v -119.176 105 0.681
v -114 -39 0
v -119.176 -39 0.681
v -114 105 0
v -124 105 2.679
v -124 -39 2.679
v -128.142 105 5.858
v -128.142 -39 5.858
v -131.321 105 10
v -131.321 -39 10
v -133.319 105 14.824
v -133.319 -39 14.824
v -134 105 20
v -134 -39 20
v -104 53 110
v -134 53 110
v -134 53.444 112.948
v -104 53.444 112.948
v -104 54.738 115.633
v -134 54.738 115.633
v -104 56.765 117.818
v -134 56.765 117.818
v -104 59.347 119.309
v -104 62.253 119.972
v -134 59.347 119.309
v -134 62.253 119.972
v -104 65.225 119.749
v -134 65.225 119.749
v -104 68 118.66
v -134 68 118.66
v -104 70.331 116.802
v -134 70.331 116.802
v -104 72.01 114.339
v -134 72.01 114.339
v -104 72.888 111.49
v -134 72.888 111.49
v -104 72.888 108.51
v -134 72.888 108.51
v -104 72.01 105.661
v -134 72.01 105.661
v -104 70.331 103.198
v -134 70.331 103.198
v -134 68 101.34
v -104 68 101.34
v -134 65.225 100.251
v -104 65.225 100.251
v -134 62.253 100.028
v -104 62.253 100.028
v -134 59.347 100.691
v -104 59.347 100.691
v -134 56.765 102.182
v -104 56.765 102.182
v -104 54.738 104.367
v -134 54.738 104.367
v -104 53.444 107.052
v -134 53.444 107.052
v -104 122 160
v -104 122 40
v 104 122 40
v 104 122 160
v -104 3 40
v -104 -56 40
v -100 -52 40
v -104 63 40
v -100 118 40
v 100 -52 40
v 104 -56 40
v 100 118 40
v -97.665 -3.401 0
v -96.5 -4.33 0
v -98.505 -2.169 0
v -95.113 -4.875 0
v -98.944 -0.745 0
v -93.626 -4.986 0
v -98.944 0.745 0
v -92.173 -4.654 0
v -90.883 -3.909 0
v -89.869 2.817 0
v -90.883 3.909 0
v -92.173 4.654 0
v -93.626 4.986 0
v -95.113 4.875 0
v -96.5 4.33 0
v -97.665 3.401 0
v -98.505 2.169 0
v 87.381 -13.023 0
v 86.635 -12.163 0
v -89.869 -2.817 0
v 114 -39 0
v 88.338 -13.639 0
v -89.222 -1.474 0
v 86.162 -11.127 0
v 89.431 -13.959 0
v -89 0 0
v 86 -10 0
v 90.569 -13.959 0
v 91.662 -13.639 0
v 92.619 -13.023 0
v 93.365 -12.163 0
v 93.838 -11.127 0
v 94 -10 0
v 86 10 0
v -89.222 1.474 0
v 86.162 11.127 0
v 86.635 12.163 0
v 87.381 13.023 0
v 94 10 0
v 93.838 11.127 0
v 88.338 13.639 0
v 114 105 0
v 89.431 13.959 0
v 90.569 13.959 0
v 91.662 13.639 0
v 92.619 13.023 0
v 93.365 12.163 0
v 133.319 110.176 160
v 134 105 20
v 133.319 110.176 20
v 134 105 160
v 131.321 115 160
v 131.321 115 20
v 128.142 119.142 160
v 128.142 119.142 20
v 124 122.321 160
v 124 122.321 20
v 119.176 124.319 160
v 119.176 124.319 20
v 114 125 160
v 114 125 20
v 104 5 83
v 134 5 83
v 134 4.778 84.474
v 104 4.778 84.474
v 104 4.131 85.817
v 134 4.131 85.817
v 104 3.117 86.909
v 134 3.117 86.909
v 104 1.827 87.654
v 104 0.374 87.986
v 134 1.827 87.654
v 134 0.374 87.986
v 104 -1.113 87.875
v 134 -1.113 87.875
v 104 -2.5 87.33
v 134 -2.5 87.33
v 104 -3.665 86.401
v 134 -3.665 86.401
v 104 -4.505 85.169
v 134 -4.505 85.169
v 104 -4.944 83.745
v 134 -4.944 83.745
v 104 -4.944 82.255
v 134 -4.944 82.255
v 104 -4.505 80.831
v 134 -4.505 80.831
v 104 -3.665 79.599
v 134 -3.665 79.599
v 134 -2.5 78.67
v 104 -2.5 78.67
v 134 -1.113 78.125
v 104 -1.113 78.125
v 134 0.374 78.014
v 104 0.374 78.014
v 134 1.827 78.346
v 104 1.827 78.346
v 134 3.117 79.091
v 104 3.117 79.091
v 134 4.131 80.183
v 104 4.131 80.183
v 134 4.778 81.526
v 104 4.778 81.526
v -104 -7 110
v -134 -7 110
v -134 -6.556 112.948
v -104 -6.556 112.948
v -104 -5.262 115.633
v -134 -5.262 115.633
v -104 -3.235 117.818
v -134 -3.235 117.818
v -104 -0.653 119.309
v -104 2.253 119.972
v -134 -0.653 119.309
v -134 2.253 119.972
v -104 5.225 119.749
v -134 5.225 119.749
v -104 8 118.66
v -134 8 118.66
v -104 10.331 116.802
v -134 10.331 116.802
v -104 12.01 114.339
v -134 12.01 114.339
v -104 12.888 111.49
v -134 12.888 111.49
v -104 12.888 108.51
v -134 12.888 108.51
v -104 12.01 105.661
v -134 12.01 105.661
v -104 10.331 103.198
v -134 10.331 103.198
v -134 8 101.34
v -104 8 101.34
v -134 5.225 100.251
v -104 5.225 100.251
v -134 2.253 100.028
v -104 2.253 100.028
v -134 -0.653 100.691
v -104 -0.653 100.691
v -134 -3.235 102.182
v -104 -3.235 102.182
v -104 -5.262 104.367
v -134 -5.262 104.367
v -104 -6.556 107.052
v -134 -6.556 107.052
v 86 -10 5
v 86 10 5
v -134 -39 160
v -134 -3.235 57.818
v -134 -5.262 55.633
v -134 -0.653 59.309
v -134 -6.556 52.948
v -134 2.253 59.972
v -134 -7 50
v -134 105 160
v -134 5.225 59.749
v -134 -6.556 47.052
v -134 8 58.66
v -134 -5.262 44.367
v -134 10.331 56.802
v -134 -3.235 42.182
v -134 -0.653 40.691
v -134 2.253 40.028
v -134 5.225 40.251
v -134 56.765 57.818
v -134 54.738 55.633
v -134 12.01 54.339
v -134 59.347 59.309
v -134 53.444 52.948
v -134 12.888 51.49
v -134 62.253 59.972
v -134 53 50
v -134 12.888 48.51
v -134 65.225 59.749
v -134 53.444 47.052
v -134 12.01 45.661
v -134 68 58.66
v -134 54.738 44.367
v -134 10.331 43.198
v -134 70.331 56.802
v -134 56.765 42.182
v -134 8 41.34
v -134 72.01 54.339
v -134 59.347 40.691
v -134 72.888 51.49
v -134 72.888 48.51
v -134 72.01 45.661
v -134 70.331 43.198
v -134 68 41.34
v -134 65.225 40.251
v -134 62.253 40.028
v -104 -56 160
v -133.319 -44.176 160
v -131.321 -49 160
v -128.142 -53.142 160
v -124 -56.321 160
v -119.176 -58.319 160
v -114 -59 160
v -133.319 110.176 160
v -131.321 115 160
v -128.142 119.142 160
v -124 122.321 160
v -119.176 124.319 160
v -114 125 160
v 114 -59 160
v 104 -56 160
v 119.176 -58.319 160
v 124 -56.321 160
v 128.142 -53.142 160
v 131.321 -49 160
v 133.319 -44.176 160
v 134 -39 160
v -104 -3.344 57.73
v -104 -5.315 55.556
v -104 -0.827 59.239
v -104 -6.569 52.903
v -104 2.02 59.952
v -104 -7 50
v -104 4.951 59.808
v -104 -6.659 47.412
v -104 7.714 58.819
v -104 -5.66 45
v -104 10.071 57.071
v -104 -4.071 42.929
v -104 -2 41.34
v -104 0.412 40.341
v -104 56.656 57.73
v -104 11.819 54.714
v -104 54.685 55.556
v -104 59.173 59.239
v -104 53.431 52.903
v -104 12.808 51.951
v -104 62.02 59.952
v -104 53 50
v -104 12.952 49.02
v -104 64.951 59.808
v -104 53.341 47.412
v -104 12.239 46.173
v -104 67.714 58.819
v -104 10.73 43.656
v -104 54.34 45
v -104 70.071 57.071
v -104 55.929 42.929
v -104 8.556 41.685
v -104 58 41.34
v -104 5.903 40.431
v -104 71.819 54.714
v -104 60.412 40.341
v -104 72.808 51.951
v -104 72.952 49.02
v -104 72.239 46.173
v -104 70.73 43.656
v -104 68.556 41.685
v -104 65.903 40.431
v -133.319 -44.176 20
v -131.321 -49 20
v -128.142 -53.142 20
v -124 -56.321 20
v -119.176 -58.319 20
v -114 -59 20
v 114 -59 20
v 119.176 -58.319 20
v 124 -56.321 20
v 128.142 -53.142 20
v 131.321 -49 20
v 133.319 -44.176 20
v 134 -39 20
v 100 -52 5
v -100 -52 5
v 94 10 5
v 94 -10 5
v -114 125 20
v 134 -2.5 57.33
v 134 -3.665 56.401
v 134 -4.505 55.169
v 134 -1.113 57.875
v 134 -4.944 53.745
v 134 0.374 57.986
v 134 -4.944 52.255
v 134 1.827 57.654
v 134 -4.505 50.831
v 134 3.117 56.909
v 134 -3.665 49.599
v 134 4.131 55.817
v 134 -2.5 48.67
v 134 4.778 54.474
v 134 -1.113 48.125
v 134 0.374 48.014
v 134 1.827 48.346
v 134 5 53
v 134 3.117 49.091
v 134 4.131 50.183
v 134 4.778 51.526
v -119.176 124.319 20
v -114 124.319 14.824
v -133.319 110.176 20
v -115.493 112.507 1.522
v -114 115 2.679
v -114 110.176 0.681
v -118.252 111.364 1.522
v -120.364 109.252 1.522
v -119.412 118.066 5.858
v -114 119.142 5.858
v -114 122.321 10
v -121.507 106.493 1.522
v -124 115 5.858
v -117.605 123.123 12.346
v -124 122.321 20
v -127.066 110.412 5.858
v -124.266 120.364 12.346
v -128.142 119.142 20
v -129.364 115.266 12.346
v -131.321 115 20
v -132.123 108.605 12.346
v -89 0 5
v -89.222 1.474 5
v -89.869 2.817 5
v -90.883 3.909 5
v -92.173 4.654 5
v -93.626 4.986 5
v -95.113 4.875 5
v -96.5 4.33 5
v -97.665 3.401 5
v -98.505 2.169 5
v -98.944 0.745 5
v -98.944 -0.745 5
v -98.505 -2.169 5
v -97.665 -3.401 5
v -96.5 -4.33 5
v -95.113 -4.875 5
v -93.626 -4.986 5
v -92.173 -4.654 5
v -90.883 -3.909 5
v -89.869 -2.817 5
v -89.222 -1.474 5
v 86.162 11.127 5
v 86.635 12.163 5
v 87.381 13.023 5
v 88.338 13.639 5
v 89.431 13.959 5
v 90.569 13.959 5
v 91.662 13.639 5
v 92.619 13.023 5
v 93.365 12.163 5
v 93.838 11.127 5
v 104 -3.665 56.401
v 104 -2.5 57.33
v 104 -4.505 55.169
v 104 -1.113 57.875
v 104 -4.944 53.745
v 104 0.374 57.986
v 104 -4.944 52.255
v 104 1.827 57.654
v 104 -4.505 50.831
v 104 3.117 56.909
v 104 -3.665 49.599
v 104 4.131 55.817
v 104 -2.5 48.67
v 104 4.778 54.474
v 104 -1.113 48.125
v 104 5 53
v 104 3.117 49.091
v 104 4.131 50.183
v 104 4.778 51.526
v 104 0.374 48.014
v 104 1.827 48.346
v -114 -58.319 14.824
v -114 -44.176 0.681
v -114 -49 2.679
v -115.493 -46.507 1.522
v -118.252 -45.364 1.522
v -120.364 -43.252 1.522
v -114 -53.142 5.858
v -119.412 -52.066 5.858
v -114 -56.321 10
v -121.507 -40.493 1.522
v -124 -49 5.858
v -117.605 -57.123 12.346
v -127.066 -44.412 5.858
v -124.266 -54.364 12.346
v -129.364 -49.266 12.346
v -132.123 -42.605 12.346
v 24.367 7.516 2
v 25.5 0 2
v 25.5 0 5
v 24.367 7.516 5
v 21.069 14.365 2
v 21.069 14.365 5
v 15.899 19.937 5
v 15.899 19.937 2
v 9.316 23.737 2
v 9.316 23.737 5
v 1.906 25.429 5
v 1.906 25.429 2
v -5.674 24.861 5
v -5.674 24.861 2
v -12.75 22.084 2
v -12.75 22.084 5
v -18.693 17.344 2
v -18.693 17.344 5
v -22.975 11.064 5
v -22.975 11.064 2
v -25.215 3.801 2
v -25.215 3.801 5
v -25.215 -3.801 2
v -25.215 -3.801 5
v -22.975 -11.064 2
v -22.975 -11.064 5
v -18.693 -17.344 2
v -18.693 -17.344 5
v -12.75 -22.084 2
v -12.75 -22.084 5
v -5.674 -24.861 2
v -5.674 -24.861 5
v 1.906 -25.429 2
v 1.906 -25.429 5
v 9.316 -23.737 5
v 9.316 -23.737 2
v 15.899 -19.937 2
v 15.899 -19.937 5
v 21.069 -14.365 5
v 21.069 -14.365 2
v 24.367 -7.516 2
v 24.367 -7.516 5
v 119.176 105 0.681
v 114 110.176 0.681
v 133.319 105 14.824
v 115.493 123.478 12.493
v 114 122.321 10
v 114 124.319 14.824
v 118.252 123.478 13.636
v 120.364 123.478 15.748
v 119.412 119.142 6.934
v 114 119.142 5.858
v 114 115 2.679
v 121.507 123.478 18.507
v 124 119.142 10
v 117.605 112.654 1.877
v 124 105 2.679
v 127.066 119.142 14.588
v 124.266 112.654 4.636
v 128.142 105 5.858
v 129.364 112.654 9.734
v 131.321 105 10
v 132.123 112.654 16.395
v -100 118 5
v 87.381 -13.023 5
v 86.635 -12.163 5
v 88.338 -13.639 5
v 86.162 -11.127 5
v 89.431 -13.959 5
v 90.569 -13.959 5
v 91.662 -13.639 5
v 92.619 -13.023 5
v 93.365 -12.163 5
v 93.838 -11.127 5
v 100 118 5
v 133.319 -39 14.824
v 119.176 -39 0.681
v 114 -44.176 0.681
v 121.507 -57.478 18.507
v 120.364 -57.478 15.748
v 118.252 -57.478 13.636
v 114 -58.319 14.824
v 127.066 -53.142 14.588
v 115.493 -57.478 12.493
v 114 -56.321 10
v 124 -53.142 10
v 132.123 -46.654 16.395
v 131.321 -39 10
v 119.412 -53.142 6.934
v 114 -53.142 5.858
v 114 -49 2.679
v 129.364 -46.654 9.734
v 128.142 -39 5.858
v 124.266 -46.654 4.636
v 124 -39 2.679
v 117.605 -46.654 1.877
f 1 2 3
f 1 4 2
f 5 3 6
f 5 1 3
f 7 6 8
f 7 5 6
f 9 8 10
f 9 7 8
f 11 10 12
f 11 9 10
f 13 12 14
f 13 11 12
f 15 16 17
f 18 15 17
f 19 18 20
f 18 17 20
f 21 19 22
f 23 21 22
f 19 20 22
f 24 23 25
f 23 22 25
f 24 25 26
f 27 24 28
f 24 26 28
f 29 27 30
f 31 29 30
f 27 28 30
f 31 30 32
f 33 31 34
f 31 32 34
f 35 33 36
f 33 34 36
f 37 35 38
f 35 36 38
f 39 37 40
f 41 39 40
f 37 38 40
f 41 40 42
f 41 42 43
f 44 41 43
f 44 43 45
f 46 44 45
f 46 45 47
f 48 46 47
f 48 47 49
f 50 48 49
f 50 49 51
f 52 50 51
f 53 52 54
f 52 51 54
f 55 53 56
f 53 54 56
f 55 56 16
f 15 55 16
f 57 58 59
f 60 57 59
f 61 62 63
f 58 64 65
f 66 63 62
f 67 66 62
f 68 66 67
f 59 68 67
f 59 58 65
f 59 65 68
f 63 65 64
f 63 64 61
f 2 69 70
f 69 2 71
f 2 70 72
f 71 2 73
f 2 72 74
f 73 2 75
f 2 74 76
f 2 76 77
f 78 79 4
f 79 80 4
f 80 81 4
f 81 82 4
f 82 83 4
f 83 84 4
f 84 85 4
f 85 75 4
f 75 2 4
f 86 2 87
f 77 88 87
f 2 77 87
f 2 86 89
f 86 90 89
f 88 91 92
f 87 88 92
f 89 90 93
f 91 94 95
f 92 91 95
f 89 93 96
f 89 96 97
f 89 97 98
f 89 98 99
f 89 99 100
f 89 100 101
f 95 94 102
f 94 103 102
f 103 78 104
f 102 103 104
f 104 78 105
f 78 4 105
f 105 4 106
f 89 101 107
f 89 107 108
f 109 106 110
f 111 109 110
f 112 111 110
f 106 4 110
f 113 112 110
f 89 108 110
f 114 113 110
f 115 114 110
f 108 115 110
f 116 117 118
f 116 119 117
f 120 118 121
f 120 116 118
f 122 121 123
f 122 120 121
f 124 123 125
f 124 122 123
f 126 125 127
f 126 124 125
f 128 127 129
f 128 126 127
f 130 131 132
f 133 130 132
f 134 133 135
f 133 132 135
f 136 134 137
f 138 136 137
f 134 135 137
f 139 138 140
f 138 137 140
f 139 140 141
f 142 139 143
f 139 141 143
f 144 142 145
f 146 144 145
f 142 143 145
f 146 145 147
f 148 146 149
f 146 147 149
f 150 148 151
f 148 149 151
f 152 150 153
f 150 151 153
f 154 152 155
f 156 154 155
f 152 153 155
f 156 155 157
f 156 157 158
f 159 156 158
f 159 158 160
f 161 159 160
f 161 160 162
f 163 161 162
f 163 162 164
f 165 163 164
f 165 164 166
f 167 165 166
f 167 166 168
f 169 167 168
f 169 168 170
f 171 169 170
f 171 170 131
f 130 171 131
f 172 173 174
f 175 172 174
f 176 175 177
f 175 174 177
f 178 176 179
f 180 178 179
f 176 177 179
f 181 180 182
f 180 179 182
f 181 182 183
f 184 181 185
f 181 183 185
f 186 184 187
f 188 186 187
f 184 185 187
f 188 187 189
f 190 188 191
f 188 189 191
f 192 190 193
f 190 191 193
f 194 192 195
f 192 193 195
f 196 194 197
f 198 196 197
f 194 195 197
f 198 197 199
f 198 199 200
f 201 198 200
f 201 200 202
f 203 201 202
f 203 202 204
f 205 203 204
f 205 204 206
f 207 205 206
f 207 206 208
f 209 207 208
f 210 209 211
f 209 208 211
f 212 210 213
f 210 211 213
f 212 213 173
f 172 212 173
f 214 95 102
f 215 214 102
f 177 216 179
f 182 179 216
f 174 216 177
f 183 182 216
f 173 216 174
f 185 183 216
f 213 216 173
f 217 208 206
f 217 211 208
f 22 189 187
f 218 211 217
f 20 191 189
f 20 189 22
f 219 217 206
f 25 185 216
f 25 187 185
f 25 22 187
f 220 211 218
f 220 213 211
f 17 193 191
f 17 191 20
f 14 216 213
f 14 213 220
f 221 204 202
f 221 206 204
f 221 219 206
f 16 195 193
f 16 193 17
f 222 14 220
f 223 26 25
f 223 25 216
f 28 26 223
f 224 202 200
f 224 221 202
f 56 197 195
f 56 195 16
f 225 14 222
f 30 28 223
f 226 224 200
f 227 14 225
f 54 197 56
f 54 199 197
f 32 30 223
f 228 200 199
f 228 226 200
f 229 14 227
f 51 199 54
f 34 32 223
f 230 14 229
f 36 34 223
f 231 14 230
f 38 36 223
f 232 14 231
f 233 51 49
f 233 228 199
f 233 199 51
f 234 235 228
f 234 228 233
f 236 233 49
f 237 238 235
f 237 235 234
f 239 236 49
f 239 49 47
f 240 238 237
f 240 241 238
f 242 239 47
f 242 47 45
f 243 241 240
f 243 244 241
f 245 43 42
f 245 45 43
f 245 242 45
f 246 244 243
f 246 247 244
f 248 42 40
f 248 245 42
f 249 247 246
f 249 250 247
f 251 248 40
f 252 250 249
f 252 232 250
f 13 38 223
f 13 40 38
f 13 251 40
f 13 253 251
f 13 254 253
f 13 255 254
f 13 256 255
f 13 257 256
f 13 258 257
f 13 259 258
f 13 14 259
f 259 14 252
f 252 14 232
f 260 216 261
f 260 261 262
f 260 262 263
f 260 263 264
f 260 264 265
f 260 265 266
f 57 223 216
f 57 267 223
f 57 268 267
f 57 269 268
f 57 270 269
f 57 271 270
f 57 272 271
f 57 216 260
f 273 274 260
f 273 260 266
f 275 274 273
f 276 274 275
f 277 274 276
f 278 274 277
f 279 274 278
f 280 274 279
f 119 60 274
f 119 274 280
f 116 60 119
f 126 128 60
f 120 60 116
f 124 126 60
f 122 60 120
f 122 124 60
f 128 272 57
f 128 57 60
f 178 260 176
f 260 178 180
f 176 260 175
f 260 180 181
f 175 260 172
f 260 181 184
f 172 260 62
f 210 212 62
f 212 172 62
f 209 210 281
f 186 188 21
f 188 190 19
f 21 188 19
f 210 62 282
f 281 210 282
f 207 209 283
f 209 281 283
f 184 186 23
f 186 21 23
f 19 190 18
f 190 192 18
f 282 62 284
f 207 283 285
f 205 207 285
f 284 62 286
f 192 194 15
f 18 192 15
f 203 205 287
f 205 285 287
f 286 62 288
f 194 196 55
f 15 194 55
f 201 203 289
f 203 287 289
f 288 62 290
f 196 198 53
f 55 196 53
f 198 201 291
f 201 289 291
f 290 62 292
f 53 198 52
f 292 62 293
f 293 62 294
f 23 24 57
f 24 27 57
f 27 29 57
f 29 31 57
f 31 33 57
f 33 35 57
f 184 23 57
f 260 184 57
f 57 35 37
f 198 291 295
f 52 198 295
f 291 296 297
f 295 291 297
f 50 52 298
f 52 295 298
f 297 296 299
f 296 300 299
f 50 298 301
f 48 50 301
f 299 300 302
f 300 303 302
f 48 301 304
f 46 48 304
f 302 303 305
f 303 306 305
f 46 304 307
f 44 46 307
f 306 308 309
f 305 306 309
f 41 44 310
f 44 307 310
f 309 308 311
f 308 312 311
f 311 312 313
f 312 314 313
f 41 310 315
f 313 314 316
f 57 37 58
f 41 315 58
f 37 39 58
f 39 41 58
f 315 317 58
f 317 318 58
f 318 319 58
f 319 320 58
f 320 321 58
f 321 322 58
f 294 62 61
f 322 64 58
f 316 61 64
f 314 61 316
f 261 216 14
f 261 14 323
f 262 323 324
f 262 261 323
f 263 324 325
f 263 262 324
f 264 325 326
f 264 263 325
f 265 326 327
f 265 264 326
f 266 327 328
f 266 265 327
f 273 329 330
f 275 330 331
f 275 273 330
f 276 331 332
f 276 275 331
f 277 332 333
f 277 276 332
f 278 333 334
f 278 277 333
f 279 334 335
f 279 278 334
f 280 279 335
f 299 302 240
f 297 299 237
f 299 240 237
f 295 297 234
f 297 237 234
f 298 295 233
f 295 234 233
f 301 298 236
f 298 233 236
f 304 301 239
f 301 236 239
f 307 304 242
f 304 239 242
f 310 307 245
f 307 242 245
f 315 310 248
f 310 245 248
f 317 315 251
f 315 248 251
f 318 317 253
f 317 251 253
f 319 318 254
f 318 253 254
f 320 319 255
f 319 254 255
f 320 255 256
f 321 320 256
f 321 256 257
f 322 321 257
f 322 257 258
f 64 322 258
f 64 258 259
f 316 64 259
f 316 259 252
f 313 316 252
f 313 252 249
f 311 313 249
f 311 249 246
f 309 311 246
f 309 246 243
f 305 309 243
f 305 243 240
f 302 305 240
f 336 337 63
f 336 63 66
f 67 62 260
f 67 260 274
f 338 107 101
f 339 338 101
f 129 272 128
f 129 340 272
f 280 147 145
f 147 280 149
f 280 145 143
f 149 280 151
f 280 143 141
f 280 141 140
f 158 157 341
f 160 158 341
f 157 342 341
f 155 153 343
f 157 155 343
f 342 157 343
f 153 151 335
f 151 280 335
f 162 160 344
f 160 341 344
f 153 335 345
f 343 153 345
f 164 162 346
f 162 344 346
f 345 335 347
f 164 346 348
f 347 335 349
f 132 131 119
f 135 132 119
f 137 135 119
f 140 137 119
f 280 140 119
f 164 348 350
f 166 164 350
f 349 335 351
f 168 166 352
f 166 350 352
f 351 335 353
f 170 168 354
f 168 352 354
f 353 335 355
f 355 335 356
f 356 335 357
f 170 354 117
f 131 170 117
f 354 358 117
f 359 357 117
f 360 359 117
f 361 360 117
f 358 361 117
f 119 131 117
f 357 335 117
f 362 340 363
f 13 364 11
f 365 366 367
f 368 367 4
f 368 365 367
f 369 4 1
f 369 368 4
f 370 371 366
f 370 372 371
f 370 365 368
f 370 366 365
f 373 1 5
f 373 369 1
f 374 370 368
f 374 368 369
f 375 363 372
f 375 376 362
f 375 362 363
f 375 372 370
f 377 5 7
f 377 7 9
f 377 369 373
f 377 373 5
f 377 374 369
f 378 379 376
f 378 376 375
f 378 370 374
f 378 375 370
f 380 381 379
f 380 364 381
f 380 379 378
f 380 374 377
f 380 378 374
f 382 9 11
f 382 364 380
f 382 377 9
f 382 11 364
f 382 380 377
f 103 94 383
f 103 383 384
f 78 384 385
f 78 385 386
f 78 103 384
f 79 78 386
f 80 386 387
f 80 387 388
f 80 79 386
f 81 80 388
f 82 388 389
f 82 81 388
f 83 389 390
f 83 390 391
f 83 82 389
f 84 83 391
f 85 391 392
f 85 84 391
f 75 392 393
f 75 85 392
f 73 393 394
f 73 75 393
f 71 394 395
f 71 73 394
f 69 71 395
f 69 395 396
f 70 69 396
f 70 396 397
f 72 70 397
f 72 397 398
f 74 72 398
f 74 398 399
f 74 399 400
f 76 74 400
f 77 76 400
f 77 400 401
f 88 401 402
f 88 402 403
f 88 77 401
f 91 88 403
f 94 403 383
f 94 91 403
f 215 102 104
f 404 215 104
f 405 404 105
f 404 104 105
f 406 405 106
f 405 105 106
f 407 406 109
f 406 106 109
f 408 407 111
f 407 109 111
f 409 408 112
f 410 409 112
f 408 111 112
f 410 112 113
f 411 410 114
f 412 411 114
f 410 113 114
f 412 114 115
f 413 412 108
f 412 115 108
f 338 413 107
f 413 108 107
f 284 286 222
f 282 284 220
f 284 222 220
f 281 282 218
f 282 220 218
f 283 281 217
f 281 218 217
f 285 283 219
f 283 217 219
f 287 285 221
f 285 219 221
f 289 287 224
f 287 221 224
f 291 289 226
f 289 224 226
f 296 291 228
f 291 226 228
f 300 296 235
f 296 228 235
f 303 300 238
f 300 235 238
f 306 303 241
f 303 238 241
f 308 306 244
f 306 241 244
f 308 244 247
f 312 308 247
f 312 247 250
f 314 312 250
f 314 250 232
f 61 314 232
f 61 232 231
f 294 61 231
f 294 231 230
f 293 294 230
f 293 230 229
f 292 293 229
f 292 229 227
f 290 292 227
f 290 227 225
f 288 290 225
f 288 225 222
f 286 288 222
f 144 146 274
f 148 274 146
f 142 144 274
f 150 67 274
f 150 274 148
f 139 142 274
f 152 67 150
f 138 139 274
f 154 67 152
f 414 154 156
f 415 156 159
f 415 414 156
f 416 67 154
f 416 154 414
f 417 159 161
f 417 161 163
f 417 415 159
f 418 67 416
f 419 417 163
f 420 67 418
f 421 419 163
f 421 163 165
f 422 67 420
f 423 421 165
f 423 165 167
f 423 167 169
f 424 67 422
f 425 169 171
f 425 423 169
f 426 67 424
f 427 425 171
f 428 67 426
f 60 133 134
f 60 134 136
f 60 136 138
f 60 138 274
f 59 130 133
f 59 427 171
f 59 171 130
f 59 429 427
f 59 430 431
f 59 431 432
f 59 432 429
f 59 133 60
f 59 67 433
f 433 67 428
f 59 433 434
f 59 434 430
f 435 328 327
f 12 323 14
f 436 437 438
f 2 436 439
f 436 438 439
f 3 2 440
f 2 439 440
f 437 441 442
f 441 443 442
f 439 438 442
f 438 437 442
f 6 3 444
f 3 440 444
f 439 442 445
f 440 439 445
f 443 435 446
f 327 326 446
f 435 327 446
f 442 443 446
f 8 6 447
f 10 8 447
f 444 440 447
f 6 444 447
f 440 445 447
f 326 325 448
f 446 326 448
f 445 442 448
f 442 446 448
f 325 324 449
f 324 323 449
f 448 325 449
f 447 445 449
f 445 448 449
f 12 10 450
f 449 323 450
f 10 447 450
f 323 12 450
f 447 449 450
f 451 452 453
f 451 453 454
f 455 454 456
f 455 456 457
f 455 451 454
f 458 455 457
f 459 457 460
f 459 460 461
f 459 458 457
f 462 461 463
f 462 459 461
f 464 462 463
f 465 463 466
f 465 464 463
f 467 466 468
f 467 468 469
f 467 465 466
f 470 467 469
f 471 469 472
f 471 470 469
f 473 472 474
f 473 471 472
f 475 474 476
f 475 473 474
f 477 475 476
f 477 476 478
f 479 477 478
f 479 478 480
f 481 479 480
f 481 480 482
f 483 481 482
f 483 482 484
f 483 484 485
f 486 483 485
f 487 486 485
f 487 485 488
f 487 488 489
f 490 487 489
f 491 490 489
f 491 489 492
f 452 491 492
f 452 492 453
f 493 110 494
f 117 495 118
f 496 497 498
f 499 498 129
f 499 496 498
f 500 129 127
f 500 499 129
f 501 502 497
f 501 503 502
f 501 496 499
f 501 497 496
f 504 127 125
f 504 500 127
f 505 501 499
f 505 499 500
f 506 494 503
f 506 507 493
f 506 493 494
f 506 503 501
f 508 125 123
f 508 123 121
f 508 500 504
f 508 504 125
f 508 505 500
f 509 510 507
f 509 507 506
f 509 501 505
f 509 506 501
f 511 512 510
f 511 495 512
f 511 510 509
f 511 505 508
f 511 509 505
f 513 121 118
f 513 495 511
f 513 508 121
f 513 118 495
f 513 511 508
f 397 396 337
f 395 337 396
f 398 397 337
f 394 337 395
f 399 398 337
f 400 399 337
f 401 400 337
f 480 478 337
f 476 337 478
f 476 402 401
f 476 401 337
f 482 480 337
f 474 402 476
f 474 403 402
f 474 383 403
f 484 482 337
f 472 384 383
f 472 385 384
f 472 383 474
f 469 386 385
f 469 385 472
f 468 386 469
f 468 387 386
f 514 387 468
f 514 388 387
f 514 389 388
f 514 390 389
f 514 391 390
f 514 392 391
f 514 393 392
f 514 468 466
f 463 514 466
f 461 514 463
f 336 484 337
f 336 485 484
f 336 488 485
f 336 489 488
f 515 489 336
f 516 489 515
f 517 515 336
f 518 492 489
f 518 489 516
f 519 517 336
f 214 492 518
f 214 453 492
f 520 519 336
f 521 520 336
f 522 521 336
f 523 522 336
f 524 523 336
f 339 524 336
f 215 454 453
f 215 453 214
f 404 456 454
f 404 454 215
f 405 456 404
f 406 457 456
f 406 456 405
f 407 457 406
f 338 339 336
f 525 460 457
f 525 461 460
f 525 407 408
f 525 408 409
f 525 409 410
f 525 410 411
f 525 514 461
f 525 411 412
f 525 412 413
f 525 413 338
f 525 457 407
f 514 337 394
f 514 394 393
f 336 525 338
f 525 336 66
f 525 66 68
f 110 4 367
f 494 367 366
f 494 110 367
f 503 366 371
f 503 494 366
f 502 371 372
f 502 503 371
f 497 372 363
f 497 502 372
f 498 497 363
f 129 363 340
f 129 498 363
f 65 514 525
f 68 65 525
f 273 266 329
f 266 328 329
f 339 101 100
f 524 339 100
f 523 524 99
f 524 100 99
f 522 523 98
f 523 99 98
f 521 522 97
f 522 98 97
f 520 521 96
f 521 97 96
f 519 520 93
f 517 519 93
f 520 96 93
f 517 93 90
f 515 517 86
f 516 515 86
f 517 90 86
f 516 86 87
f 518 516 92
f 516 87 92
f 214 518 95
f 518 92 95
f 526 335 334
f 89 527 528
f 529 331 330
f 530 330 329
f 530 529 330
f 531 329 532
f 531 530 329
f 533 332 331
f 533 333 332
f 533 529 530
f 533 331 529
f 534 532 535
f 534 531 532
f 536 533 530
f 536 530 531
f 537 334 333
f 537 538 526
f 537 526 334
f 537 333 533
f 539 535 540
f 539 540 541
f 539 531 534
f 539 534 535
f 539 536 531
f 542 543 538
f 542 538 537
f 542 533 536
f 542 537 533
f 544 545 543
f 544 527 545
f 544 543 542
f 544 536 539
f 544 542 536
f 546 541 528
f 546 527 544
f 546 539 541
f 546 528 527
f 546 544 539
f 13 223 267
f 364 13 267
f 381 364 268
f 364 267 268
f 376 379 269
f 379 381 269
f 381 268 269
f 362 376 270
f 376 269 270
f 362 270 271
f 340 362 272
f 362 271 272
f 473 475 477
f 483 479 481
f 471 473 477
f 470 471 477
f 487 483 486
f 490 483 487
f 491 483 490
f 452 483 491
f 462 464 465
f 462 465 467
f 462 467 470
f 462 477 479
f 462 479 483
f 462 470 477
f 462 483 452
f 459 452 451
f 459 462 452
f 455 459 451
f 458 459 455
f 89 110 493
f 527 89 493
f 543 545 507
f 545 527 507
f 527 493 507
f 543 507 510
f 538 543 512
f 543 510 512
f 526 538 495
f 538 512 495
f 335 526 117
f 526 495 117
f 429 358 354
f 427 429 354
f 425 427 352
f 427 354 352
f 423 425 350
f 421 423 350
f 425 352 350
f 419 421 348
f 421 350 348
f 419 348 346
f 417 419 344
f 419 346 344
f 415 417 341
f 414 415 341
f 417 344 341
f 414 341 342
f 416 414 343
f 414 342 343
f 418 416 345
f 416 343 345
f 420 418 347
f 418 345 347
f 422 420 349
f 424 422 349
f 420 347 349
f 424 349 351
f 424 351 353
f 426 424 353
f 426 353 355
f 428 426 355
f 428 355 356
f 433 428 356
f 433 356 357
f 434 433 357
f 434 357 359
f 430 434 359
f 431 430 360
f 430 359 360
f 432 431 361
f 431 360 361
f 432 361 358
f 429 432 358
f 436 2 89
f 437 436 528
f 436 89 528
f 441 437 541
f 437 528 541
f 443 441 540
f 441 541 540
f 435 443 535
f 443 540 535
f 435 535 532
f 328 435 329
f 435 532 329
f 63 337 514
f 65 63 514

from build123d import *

# Parameters (mm, degrees)
F0_R      = 25.5
F1_DEPTH  = 2
F0_W      = 200
F0_H      = 170
F0_R_2    = 5
F2_DEPTH  = 5
F0_W_2    = 268
F0_H_2    = 184
F0_W_3    = 208
F0_H_3    = 178
F3_DEPTH  = 160
F4_DEPTH  = 40
F5_R      = 5
F6_DEPTH  = 30.3
F7_DEPTH  = 30
F8_DEPTH  = 10
F9_R      = 10
F10_DEPTH = 30
F11_R     = 20


# Not quite as in the source:
# - a feature names something its author has since deleted; it is built from what else it names


with BuildPart() as f1:
    # F0 (on Top) → F1 (new body)
    with BuildSketch(Plane.XY):
        Circle(F0_R)
    extrude(amount=F1_DEPTH)

    # F0 (on Top) → F2 (join)
    with BuildSketch(Plane.XY):
        with Locations((0, 33)):
            Rectangle(F0_W, F0_H)
        with Locations((-94, 0)):
            Circle(F0_R_2, mode=Mode.SUBTRACT)
        Circle(F0_R, mode=Mode.SUBTRACT)
        with BuildLine():
            Line((94, 10), (94, 0))
            Line((94, 0), (94, -10))
            ThreePointArc((94, -10), (90, -14), (86, -10))
            Line((86, -10), (86, 10))
            ThreePointArc((86, 10), (90, 14), (94, 10))
        make_face(mode=Mode.SUBTRACT)
    extrude(amount=F2_DEPTH)



with BuildPart() as f3:
    # F0 (on Top) → F3 (new body)
    with BuildSketch(Plane.XY):
        with Locations((0, 33)):
            Rectangle(F0_W_2, F0_H_2)
        with Locations((0, 33)):
            Rectangle(F0_W_3, F0_H_3, mode=Mode.SUBTRACT)
    extrude(amount=F3_DEPTH)


with BuildPart() as f1_1:
    add(f1.part)

    add(f3.part)  # F4 merges F3
    # F0 (on Top) → F4 (join)
    with BuildSketch(Plane.XY):
        with Locations((0, 33)):
            Rectangle(F0_W_3, F0_H_3)
        with Locations((0, 33)):
            Rectangle(F0_W, F0_H, mode=Mode.SUBTRACT)
    extrude(amount=F4_DEPTH)

    # F5 (on face) → F6 (cut)
    with BuildSketch(Plane.YZ.offset(134)):
        with Locations((0, 83)):
            Circle(F5_R)
    extrude(amount=-F6_DEPTH, mode=Mode.SUBTRACT)

    # F5 (on face) → F7 (cut)
    with BuildSketch(Plane.YZ.offset(134)):
        with Locations((0, 53)):
            Circle(F5_R)
    extrude(amount=-F7_DEPTH, mode=Mode.SUBTRACT)

    # F0 (on Top) → F8 (cut)
    with BuildSketch(Plane.XY):
        with BuildLine():
            Line((94, -10), (94, 0))
            Line((94, 0), (94, 10))
            ThreePointArc((94, 10), (90, 14), (86, 10))
            Line((86, 10), (86, -10))
            ThreePointArc((86, -10), (90, -14), (94, -10))
        make_face()
    extrude(amount=F8_DEPTH, mode=Mode.SUBTRACT)

    # F9 (on face) → F10 (cut, through all)
    with BuildSketch(Plane(origin=(-134, 0, 0), x_dir=(0, -1, 0), z_dir=(-1, 0, 0))):
        with Locations((-63, 110)):
            Circle(F9_R)
        with Locations((-3, 110)):
            Circle(F9_R)
        with Locations((-63, 50)):
            Circle(F9_R)
        with Locations((-3, 50)):
            Circle(F9_R)
    extrude(amount=-F10_DEPTH, mode=Mode.SUBTRACT)

    # F11
    f11_edges = [f1_1.edges().sort_by_distance(p)[0] for p in [
        (-134, -59, 80),
        (-134, 125, 80),
        (134, 33, 0),
        (134, -59, 80),
        (0, -59, 0),
        (0, 125, 0),
        (-134, 33, 0),
        (134, 125, 80),
    ]]
    fillet(f11_edges, radius=F11_R)


solid = f1_1.part
